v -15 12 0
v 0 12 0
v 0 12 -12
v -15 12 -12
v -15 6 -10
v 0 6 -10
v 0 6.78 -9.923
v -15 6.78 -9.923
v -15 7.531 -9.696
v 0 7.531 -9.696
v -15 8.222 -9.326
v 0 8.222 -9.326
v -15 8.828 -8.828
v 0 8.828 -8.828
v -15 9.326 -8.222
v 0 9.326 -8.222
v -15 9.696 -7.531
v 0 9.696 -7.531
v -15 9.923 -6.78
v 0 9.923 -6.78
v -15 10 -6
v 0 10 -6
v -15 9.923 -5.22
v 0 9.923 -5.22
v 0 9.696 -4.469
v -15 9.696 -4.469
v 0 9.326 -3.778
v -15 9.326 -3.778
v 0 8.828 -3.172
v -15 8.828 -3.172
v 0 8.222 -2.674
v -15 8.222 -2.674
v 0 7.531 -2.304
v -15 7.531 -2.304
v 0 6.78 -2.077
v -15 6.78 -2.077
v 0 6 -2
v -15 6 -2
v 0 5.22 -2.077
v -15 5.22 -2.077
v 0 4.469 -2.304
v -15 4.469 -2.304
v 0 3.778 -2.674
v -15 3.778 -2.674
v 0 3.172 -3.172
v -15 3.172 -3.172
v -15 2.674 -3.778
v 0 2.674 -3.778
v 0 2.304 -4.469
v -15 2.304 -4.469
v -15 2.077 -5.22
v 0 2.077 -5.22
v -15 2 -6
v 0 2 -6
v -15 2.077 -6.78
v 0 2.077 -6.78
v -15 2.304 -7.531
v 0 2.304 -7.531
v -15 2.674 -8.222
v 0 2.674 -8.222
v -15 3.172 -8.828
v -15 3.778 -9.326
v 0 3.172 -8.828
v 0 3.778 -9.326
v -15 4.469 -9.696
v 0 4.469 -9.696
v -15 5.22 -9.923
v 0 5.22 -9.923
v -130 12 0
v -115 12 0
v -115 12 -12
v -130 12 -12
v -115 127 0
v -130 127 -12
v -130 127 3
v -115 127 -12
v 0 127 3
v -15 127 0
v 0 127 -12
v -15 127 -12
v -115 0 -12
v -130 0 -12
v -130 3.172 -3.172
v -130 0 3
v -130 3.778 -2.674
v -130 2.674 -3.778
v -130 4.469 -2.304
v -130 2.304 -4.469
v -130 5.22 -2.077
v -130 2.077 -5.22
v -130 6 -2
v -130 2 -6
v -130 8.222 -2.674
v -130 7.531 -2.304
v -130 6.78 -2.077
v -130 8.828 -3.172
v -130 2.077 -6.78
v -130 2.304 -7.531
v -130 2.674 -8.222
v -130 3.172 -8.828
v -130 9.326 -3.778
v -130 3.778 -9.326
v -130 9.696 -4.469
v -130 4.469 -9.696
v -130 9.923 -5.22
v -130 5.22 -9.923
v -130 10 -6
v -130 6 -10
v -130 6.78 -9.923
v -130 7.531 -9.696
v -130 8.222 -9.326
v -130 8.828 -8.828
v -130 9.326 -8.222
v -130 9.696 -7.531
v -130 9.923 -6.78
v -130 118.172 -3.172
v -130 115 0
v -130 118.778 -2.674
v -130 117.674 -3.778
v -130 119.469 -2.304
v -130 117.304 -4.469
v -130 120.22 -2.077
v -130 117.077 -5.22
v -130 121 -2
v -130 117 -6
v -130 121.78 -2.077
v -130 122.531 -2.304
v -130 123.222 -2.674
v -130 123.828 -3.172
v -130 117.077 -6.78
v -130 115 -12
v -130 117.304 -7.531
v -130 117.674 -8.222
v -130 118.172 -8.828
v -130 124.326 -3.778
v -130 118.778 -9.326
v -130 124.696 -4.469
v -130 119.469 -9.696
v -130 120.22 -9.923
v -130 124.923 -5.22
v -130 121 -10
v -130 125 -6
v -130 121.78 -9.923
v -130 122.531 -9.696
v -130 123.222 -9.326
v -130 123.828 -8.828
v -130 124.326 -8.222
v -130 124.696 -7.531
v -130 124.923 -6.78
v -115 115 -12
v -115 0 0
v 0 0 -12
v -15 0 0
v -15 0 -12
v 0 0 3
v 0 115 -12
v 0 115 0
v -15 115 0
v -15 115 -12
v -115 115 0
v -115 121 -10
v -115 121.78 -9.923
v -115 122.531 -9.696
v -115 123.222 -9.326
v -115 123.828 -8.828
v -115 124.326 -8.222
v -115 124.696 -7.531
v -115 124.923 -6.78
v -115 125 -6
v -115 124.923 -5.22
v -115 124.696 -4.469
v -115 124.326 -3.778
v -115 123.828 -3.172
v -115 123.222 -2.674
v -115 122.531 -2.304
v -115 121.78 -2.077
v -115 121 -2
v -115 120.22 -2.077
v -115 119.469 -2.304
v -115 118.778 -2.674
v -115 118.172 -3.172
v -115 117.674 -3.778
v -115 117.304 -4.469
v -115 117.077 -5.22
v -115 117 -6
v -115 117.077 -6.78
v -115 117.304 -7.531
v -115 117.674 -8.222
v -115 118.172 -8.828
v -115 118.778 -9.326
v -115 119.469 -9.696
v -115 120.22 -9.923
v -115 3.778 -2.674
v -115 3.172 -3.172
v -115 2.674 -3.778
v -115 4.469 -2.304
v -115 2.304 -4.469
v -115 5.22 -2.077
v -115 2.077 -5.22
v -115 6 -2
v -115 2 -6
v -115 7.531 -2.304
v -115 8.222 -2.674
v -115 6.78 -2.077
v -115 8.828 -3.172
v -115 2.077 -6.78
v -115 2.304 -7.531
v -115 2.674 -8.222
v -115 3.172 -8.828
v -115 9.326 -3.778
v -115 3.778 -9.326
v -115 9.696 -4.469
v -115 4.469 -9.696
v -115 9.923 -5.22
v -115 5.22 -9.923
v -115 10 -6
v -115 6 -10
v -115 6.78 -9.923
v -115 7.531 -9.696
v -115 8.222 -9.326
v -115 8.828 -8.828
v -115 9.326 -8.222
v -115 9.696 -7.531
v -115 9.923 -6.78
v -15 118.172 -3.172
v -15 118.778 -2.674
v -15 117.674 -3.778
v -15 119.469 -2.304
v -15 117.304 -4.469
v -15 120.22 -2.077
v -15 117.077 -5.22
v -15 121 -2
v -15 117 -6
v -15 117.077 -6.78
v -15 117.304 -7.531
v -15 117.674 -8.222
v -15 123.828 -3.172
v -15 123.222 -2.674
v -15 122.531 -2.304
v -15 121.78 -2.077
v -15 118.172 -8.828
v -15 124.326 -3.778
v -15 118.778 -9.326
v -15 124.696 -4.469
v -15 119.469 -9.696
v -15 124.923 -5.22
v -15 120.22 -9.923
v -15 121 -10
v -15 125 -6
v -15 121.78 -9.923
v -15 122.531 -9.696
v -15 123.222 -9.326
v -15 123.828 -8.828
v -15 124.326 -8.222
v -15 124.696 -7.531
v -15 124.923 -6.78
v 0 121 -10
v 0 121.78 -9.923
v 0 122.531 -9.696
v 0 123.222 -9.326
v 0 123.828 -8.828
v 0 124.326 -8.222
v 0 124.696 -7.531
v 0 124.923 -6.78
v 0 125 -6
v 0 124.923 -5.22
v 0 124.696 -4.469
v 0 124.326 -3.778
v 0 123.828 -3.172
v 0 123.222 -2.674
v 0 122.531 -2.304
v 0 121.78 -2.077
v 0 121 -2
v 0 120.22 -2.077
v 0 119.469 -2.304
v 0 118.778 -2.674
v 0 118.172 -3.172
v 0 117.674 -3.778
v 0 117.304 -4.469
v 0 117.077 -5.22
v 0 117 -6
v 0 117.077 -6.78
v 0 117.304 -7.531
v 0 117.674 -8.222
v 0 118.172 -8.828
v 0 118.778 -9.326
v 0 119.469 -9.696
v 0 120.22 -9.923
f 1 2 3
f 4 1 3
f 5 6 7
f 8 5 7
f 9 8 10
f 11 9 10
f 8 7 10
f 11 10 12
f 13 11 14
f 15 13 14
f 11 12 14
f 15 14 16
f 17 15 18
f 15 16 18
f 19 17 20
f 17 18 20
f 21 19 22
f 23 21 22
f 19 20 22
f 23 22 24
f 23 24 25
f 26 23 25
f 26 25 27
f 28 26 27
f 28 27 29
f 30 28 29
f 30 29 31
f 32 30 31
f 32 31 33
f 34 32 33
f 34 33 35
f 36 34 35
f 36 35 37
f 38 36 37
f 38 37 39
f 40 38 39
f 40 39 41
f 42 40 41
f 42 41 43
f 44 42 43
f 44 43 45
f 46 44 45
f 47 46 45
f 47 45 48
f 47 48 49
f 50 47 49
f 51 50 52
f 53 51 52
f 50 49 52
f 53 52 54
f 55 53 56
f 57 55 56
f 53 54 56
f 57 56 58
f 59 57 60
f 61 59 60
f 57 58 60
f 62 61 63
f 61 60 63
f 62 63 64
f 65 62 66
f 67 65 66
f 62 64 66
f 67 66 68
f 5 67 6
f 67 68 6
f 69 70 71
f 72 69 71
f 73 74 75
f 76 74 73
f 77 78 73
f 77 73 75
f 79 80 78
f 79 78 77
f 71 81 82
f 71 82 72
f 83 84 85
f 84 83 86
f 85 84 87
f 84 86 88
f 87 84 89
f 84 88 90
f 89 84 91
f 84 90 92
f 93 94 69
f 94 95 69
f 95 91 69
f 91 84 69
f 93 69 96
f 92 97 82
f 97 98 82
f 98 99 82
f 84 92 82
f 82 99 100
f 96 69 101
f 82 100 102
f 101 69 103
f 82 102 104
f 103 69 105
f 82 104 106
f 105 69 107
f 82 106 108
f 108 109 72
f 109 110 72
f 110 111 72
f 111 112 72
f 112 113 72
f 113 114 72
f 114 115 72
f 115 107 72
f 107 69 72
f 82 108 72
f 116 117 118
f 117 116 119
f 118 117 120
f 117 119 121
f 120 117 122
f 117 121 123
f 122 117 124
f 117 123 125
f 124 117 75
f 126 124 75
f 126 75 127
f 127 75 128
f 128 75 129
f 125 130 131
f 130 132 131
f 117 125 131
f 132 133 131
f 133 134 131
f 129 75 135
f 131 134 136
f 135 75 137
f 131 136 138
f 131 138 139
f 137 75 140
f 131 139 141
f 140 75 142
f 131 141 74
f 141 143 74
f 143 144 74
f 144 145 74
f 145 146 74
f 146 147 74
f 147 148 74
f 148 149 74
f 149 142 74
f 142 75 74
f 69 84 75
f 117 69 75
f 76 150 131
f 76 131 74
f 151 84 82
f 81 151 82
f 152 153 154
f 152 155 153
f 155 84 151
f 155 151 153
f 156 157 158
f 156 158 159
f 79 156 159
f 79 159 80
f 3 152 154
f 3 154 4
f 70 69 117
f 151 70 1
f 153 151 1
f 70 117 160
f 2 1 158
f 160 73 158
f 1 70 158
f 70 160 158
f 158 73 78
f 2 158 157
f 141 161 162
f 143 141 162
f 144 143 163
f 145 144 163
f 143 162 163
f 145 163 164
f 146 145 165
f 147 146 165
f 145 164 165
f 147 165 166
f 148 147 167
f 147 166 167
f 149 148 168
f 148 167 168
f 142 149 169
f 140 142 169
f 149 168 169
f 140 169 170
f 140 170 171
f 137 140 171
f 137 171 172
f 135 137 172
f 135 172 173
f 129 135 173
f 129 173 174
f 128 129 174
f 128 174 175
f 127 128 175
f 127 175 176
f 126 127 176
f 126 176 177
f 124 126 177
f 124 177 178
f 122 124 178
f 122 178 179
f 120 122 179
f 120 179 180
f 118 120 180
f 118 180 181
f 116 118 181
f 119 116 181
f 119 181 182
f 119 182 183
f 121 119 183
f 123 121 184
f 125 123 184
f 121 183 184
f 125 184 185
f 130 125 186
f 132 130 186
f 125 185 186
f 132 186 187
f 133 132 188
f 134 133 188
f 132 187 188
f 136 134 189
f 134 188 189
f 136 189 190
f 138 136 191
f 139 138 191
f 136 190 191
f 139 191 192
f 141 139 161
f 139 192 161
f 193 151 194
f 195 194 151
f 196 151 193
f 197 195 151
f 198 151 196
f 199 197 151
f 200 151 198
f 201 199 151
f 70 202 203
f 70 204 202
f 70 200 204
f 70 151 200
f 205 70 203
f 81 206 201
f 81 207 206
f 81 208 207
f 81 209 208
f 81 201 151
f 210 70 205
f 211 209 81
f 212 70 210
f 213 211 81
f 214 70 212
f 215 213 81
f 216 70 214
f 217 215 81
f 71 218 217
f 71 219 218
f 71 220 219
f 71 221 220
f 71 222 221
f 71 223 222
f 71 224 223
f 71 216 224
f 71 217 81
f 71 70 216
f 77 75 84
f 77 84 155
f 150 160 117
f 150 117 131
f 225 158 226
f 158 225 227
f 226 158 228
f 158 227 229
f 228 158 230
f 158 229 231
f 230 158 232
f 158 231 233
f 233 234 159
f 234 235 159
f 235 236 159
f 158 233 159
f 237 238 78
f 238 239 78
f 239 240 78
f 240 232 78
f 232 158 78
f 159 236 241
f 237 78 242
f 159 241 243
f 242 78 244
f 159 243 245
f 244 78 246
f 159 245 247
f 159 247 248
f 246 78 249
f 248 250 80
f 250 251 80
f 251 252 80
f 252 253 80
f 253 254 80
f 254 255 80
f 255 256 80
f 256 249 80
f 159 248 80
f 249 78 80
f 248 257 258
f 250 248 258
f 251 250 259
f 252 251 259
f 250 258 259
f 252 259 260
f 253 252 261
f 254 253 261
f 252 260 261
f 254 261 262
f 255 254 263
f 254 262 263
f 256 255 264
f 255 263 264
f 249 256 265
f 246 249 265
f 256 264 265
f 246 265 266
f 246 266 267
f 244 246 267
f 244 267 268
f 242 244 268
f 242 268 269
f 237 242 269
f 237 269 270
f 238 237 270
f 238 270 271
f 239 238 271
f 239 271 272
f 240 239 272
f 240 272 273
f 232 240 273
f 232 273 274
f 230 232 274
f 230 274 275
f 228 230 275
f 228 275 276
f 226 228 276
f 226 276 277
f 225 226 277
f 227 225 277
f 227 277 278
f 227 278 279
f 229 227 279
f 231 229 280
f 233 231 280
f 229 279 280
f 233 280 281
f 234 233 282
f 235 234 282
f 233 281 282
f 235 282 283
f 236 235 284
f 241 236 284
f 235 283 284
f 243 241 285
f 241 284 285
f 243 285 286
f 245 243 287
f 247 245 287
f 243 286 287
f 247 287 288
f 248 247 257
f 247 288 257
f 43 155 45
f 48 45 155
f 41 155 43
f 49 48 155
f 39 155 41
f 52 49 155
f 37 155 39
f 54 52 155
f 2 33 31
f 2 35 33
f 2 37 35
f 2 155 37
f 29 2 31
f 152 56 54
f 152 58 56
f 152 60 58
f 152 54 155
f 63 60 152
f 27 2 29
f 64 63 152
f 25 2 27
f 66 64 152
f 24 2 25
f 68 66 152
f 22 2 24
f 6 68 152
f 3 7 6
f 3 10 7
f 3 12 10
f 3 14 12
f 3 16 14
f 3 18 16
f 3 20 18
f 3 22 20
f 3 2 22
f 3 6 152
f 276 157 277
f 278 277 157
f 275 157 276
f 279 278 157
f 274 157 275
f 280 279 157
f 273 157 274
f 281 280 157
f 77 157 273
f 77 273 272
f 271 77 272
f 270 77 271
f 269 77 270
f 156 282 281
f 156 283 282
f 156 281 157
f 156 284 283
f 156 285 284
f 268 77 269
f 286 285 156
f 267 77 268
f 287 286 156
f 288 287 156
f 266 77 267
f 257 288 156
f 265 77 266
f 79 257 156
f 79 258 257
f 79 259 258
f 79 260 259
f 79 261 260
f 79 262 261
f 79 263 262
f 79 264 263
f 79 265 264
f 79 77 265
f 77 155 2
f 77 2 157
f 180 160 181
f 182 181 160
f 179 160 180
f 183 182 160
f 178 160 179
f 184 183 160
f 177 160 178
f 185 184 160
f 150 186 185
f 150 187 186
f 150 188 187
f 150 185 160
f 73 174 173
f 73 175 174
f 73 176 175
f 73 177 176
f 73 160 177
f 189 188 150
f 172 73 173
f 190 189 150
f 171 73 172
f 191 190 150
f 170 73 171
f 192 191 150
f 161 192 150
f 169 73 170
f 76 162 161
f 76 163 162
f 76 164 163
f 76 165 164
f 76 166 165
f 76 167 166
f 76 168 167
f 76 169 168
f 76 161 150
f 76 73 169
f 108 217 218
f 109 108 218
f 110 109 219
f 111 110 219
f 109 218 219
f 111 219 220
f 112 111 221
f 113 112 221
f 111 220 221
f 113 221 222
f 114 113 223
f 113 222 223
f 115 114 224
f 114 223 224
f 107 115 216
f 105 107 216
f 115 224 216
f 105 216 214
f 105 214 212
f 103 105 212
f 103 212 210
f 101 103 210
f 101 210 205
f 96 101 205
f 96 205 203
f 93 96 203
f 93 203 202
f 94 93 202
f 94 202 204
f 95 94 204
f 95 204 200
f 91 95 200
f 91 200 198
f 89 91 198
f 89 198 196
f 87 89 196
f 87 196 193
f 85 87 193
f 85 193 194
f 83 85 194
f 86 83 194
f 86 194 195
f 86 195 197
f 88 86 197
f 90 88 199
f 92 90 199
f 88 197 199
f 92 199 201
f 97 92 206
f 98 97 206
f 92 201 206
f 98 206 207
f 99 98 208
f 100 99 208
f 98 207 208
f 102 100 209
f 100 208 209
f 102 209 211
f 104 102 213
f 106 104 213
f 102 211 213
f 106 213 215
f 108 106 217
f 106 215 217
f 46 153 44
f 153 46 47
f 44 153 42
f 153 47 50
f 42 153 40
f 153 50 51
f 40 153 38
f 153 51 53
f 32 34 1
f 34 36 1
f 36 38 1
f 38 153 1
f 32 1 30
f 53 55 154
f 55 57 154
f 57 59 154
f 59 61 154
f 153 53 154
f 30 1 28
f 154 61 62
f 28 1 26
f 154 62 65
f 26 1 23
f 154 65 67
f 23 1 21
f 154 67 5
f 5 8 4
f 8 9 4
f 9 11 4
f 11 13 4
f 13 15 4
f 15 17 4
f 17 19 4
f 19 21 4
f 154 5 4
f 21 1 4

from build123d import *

# Parameters (mm, degrees)
ESQUISSE1_W             = 130
ESQUISSE1_H             = 127
BOSS_EXTRU_1_DEPTH      = 3
ESQUISSE2_W             = 12
ESQUISSE2_H             = 12
ESQUISSE2_R             = 4
BOSS_EXTRU_2_DEPTH      = 130
ESQUISSE3_W             = 100
ESQUISSE3_H             = 12
ENL_V_MAT_EXTRU_1_DEPTH = 160


with BuildPart() as part:
    # Esquisse1 → Boss.-Extru.1 (new body)
    with BuildSketch(Plane.XY):
        with Locations((-65, 63.5)):
            Rectangle(ESQUISSE1_W, ESQUISSE1_H)
    extrude(amount=BOSS_EXTRU_1_DEPTH)

    # Esquisse2 → Boss.-Extru.2 (add)
    with BuildSketch(Plane(origin=(0, 0, 0), x_dir=(0, 0, -1), z_dir=(1, 0, 0))):
        with Locations((6, 6)):
            Rectangle(ESQUISSE2_W, ESQUISSE2_H)
        with Locations((6, 6)):
            Circle(ESQUISSE2_R, mode=Mode.SUBTRACT)
        with Locations((6, 121)):
            Rectangle(ESQUISSE2_W, ESQUISSE2_H)
        with Locations((6, 121)):
            Circle(ESQUISSE2_R, mode=Mode.SUBTRACT)
    extrude(amount=-BOSS_EXTRU_2_DEPTH)

    # Esquisse3 → Enlèv. mat.-Extru.1 (cut)
    with BuildSketch(Plane(origin=(0, 127, 0), x_dir=(1, 0, 0), z_dir=(0, 1, 0))):
        with Locations((-65, 6)):
            Rectangle(ESQUISSE3_W, ESQUISSE3_H)
    extrude(amount=-ENL_V_MAT_EXTRU_1_DEPTH, mode=Mode.SUBTRACT)


solid = part.part
